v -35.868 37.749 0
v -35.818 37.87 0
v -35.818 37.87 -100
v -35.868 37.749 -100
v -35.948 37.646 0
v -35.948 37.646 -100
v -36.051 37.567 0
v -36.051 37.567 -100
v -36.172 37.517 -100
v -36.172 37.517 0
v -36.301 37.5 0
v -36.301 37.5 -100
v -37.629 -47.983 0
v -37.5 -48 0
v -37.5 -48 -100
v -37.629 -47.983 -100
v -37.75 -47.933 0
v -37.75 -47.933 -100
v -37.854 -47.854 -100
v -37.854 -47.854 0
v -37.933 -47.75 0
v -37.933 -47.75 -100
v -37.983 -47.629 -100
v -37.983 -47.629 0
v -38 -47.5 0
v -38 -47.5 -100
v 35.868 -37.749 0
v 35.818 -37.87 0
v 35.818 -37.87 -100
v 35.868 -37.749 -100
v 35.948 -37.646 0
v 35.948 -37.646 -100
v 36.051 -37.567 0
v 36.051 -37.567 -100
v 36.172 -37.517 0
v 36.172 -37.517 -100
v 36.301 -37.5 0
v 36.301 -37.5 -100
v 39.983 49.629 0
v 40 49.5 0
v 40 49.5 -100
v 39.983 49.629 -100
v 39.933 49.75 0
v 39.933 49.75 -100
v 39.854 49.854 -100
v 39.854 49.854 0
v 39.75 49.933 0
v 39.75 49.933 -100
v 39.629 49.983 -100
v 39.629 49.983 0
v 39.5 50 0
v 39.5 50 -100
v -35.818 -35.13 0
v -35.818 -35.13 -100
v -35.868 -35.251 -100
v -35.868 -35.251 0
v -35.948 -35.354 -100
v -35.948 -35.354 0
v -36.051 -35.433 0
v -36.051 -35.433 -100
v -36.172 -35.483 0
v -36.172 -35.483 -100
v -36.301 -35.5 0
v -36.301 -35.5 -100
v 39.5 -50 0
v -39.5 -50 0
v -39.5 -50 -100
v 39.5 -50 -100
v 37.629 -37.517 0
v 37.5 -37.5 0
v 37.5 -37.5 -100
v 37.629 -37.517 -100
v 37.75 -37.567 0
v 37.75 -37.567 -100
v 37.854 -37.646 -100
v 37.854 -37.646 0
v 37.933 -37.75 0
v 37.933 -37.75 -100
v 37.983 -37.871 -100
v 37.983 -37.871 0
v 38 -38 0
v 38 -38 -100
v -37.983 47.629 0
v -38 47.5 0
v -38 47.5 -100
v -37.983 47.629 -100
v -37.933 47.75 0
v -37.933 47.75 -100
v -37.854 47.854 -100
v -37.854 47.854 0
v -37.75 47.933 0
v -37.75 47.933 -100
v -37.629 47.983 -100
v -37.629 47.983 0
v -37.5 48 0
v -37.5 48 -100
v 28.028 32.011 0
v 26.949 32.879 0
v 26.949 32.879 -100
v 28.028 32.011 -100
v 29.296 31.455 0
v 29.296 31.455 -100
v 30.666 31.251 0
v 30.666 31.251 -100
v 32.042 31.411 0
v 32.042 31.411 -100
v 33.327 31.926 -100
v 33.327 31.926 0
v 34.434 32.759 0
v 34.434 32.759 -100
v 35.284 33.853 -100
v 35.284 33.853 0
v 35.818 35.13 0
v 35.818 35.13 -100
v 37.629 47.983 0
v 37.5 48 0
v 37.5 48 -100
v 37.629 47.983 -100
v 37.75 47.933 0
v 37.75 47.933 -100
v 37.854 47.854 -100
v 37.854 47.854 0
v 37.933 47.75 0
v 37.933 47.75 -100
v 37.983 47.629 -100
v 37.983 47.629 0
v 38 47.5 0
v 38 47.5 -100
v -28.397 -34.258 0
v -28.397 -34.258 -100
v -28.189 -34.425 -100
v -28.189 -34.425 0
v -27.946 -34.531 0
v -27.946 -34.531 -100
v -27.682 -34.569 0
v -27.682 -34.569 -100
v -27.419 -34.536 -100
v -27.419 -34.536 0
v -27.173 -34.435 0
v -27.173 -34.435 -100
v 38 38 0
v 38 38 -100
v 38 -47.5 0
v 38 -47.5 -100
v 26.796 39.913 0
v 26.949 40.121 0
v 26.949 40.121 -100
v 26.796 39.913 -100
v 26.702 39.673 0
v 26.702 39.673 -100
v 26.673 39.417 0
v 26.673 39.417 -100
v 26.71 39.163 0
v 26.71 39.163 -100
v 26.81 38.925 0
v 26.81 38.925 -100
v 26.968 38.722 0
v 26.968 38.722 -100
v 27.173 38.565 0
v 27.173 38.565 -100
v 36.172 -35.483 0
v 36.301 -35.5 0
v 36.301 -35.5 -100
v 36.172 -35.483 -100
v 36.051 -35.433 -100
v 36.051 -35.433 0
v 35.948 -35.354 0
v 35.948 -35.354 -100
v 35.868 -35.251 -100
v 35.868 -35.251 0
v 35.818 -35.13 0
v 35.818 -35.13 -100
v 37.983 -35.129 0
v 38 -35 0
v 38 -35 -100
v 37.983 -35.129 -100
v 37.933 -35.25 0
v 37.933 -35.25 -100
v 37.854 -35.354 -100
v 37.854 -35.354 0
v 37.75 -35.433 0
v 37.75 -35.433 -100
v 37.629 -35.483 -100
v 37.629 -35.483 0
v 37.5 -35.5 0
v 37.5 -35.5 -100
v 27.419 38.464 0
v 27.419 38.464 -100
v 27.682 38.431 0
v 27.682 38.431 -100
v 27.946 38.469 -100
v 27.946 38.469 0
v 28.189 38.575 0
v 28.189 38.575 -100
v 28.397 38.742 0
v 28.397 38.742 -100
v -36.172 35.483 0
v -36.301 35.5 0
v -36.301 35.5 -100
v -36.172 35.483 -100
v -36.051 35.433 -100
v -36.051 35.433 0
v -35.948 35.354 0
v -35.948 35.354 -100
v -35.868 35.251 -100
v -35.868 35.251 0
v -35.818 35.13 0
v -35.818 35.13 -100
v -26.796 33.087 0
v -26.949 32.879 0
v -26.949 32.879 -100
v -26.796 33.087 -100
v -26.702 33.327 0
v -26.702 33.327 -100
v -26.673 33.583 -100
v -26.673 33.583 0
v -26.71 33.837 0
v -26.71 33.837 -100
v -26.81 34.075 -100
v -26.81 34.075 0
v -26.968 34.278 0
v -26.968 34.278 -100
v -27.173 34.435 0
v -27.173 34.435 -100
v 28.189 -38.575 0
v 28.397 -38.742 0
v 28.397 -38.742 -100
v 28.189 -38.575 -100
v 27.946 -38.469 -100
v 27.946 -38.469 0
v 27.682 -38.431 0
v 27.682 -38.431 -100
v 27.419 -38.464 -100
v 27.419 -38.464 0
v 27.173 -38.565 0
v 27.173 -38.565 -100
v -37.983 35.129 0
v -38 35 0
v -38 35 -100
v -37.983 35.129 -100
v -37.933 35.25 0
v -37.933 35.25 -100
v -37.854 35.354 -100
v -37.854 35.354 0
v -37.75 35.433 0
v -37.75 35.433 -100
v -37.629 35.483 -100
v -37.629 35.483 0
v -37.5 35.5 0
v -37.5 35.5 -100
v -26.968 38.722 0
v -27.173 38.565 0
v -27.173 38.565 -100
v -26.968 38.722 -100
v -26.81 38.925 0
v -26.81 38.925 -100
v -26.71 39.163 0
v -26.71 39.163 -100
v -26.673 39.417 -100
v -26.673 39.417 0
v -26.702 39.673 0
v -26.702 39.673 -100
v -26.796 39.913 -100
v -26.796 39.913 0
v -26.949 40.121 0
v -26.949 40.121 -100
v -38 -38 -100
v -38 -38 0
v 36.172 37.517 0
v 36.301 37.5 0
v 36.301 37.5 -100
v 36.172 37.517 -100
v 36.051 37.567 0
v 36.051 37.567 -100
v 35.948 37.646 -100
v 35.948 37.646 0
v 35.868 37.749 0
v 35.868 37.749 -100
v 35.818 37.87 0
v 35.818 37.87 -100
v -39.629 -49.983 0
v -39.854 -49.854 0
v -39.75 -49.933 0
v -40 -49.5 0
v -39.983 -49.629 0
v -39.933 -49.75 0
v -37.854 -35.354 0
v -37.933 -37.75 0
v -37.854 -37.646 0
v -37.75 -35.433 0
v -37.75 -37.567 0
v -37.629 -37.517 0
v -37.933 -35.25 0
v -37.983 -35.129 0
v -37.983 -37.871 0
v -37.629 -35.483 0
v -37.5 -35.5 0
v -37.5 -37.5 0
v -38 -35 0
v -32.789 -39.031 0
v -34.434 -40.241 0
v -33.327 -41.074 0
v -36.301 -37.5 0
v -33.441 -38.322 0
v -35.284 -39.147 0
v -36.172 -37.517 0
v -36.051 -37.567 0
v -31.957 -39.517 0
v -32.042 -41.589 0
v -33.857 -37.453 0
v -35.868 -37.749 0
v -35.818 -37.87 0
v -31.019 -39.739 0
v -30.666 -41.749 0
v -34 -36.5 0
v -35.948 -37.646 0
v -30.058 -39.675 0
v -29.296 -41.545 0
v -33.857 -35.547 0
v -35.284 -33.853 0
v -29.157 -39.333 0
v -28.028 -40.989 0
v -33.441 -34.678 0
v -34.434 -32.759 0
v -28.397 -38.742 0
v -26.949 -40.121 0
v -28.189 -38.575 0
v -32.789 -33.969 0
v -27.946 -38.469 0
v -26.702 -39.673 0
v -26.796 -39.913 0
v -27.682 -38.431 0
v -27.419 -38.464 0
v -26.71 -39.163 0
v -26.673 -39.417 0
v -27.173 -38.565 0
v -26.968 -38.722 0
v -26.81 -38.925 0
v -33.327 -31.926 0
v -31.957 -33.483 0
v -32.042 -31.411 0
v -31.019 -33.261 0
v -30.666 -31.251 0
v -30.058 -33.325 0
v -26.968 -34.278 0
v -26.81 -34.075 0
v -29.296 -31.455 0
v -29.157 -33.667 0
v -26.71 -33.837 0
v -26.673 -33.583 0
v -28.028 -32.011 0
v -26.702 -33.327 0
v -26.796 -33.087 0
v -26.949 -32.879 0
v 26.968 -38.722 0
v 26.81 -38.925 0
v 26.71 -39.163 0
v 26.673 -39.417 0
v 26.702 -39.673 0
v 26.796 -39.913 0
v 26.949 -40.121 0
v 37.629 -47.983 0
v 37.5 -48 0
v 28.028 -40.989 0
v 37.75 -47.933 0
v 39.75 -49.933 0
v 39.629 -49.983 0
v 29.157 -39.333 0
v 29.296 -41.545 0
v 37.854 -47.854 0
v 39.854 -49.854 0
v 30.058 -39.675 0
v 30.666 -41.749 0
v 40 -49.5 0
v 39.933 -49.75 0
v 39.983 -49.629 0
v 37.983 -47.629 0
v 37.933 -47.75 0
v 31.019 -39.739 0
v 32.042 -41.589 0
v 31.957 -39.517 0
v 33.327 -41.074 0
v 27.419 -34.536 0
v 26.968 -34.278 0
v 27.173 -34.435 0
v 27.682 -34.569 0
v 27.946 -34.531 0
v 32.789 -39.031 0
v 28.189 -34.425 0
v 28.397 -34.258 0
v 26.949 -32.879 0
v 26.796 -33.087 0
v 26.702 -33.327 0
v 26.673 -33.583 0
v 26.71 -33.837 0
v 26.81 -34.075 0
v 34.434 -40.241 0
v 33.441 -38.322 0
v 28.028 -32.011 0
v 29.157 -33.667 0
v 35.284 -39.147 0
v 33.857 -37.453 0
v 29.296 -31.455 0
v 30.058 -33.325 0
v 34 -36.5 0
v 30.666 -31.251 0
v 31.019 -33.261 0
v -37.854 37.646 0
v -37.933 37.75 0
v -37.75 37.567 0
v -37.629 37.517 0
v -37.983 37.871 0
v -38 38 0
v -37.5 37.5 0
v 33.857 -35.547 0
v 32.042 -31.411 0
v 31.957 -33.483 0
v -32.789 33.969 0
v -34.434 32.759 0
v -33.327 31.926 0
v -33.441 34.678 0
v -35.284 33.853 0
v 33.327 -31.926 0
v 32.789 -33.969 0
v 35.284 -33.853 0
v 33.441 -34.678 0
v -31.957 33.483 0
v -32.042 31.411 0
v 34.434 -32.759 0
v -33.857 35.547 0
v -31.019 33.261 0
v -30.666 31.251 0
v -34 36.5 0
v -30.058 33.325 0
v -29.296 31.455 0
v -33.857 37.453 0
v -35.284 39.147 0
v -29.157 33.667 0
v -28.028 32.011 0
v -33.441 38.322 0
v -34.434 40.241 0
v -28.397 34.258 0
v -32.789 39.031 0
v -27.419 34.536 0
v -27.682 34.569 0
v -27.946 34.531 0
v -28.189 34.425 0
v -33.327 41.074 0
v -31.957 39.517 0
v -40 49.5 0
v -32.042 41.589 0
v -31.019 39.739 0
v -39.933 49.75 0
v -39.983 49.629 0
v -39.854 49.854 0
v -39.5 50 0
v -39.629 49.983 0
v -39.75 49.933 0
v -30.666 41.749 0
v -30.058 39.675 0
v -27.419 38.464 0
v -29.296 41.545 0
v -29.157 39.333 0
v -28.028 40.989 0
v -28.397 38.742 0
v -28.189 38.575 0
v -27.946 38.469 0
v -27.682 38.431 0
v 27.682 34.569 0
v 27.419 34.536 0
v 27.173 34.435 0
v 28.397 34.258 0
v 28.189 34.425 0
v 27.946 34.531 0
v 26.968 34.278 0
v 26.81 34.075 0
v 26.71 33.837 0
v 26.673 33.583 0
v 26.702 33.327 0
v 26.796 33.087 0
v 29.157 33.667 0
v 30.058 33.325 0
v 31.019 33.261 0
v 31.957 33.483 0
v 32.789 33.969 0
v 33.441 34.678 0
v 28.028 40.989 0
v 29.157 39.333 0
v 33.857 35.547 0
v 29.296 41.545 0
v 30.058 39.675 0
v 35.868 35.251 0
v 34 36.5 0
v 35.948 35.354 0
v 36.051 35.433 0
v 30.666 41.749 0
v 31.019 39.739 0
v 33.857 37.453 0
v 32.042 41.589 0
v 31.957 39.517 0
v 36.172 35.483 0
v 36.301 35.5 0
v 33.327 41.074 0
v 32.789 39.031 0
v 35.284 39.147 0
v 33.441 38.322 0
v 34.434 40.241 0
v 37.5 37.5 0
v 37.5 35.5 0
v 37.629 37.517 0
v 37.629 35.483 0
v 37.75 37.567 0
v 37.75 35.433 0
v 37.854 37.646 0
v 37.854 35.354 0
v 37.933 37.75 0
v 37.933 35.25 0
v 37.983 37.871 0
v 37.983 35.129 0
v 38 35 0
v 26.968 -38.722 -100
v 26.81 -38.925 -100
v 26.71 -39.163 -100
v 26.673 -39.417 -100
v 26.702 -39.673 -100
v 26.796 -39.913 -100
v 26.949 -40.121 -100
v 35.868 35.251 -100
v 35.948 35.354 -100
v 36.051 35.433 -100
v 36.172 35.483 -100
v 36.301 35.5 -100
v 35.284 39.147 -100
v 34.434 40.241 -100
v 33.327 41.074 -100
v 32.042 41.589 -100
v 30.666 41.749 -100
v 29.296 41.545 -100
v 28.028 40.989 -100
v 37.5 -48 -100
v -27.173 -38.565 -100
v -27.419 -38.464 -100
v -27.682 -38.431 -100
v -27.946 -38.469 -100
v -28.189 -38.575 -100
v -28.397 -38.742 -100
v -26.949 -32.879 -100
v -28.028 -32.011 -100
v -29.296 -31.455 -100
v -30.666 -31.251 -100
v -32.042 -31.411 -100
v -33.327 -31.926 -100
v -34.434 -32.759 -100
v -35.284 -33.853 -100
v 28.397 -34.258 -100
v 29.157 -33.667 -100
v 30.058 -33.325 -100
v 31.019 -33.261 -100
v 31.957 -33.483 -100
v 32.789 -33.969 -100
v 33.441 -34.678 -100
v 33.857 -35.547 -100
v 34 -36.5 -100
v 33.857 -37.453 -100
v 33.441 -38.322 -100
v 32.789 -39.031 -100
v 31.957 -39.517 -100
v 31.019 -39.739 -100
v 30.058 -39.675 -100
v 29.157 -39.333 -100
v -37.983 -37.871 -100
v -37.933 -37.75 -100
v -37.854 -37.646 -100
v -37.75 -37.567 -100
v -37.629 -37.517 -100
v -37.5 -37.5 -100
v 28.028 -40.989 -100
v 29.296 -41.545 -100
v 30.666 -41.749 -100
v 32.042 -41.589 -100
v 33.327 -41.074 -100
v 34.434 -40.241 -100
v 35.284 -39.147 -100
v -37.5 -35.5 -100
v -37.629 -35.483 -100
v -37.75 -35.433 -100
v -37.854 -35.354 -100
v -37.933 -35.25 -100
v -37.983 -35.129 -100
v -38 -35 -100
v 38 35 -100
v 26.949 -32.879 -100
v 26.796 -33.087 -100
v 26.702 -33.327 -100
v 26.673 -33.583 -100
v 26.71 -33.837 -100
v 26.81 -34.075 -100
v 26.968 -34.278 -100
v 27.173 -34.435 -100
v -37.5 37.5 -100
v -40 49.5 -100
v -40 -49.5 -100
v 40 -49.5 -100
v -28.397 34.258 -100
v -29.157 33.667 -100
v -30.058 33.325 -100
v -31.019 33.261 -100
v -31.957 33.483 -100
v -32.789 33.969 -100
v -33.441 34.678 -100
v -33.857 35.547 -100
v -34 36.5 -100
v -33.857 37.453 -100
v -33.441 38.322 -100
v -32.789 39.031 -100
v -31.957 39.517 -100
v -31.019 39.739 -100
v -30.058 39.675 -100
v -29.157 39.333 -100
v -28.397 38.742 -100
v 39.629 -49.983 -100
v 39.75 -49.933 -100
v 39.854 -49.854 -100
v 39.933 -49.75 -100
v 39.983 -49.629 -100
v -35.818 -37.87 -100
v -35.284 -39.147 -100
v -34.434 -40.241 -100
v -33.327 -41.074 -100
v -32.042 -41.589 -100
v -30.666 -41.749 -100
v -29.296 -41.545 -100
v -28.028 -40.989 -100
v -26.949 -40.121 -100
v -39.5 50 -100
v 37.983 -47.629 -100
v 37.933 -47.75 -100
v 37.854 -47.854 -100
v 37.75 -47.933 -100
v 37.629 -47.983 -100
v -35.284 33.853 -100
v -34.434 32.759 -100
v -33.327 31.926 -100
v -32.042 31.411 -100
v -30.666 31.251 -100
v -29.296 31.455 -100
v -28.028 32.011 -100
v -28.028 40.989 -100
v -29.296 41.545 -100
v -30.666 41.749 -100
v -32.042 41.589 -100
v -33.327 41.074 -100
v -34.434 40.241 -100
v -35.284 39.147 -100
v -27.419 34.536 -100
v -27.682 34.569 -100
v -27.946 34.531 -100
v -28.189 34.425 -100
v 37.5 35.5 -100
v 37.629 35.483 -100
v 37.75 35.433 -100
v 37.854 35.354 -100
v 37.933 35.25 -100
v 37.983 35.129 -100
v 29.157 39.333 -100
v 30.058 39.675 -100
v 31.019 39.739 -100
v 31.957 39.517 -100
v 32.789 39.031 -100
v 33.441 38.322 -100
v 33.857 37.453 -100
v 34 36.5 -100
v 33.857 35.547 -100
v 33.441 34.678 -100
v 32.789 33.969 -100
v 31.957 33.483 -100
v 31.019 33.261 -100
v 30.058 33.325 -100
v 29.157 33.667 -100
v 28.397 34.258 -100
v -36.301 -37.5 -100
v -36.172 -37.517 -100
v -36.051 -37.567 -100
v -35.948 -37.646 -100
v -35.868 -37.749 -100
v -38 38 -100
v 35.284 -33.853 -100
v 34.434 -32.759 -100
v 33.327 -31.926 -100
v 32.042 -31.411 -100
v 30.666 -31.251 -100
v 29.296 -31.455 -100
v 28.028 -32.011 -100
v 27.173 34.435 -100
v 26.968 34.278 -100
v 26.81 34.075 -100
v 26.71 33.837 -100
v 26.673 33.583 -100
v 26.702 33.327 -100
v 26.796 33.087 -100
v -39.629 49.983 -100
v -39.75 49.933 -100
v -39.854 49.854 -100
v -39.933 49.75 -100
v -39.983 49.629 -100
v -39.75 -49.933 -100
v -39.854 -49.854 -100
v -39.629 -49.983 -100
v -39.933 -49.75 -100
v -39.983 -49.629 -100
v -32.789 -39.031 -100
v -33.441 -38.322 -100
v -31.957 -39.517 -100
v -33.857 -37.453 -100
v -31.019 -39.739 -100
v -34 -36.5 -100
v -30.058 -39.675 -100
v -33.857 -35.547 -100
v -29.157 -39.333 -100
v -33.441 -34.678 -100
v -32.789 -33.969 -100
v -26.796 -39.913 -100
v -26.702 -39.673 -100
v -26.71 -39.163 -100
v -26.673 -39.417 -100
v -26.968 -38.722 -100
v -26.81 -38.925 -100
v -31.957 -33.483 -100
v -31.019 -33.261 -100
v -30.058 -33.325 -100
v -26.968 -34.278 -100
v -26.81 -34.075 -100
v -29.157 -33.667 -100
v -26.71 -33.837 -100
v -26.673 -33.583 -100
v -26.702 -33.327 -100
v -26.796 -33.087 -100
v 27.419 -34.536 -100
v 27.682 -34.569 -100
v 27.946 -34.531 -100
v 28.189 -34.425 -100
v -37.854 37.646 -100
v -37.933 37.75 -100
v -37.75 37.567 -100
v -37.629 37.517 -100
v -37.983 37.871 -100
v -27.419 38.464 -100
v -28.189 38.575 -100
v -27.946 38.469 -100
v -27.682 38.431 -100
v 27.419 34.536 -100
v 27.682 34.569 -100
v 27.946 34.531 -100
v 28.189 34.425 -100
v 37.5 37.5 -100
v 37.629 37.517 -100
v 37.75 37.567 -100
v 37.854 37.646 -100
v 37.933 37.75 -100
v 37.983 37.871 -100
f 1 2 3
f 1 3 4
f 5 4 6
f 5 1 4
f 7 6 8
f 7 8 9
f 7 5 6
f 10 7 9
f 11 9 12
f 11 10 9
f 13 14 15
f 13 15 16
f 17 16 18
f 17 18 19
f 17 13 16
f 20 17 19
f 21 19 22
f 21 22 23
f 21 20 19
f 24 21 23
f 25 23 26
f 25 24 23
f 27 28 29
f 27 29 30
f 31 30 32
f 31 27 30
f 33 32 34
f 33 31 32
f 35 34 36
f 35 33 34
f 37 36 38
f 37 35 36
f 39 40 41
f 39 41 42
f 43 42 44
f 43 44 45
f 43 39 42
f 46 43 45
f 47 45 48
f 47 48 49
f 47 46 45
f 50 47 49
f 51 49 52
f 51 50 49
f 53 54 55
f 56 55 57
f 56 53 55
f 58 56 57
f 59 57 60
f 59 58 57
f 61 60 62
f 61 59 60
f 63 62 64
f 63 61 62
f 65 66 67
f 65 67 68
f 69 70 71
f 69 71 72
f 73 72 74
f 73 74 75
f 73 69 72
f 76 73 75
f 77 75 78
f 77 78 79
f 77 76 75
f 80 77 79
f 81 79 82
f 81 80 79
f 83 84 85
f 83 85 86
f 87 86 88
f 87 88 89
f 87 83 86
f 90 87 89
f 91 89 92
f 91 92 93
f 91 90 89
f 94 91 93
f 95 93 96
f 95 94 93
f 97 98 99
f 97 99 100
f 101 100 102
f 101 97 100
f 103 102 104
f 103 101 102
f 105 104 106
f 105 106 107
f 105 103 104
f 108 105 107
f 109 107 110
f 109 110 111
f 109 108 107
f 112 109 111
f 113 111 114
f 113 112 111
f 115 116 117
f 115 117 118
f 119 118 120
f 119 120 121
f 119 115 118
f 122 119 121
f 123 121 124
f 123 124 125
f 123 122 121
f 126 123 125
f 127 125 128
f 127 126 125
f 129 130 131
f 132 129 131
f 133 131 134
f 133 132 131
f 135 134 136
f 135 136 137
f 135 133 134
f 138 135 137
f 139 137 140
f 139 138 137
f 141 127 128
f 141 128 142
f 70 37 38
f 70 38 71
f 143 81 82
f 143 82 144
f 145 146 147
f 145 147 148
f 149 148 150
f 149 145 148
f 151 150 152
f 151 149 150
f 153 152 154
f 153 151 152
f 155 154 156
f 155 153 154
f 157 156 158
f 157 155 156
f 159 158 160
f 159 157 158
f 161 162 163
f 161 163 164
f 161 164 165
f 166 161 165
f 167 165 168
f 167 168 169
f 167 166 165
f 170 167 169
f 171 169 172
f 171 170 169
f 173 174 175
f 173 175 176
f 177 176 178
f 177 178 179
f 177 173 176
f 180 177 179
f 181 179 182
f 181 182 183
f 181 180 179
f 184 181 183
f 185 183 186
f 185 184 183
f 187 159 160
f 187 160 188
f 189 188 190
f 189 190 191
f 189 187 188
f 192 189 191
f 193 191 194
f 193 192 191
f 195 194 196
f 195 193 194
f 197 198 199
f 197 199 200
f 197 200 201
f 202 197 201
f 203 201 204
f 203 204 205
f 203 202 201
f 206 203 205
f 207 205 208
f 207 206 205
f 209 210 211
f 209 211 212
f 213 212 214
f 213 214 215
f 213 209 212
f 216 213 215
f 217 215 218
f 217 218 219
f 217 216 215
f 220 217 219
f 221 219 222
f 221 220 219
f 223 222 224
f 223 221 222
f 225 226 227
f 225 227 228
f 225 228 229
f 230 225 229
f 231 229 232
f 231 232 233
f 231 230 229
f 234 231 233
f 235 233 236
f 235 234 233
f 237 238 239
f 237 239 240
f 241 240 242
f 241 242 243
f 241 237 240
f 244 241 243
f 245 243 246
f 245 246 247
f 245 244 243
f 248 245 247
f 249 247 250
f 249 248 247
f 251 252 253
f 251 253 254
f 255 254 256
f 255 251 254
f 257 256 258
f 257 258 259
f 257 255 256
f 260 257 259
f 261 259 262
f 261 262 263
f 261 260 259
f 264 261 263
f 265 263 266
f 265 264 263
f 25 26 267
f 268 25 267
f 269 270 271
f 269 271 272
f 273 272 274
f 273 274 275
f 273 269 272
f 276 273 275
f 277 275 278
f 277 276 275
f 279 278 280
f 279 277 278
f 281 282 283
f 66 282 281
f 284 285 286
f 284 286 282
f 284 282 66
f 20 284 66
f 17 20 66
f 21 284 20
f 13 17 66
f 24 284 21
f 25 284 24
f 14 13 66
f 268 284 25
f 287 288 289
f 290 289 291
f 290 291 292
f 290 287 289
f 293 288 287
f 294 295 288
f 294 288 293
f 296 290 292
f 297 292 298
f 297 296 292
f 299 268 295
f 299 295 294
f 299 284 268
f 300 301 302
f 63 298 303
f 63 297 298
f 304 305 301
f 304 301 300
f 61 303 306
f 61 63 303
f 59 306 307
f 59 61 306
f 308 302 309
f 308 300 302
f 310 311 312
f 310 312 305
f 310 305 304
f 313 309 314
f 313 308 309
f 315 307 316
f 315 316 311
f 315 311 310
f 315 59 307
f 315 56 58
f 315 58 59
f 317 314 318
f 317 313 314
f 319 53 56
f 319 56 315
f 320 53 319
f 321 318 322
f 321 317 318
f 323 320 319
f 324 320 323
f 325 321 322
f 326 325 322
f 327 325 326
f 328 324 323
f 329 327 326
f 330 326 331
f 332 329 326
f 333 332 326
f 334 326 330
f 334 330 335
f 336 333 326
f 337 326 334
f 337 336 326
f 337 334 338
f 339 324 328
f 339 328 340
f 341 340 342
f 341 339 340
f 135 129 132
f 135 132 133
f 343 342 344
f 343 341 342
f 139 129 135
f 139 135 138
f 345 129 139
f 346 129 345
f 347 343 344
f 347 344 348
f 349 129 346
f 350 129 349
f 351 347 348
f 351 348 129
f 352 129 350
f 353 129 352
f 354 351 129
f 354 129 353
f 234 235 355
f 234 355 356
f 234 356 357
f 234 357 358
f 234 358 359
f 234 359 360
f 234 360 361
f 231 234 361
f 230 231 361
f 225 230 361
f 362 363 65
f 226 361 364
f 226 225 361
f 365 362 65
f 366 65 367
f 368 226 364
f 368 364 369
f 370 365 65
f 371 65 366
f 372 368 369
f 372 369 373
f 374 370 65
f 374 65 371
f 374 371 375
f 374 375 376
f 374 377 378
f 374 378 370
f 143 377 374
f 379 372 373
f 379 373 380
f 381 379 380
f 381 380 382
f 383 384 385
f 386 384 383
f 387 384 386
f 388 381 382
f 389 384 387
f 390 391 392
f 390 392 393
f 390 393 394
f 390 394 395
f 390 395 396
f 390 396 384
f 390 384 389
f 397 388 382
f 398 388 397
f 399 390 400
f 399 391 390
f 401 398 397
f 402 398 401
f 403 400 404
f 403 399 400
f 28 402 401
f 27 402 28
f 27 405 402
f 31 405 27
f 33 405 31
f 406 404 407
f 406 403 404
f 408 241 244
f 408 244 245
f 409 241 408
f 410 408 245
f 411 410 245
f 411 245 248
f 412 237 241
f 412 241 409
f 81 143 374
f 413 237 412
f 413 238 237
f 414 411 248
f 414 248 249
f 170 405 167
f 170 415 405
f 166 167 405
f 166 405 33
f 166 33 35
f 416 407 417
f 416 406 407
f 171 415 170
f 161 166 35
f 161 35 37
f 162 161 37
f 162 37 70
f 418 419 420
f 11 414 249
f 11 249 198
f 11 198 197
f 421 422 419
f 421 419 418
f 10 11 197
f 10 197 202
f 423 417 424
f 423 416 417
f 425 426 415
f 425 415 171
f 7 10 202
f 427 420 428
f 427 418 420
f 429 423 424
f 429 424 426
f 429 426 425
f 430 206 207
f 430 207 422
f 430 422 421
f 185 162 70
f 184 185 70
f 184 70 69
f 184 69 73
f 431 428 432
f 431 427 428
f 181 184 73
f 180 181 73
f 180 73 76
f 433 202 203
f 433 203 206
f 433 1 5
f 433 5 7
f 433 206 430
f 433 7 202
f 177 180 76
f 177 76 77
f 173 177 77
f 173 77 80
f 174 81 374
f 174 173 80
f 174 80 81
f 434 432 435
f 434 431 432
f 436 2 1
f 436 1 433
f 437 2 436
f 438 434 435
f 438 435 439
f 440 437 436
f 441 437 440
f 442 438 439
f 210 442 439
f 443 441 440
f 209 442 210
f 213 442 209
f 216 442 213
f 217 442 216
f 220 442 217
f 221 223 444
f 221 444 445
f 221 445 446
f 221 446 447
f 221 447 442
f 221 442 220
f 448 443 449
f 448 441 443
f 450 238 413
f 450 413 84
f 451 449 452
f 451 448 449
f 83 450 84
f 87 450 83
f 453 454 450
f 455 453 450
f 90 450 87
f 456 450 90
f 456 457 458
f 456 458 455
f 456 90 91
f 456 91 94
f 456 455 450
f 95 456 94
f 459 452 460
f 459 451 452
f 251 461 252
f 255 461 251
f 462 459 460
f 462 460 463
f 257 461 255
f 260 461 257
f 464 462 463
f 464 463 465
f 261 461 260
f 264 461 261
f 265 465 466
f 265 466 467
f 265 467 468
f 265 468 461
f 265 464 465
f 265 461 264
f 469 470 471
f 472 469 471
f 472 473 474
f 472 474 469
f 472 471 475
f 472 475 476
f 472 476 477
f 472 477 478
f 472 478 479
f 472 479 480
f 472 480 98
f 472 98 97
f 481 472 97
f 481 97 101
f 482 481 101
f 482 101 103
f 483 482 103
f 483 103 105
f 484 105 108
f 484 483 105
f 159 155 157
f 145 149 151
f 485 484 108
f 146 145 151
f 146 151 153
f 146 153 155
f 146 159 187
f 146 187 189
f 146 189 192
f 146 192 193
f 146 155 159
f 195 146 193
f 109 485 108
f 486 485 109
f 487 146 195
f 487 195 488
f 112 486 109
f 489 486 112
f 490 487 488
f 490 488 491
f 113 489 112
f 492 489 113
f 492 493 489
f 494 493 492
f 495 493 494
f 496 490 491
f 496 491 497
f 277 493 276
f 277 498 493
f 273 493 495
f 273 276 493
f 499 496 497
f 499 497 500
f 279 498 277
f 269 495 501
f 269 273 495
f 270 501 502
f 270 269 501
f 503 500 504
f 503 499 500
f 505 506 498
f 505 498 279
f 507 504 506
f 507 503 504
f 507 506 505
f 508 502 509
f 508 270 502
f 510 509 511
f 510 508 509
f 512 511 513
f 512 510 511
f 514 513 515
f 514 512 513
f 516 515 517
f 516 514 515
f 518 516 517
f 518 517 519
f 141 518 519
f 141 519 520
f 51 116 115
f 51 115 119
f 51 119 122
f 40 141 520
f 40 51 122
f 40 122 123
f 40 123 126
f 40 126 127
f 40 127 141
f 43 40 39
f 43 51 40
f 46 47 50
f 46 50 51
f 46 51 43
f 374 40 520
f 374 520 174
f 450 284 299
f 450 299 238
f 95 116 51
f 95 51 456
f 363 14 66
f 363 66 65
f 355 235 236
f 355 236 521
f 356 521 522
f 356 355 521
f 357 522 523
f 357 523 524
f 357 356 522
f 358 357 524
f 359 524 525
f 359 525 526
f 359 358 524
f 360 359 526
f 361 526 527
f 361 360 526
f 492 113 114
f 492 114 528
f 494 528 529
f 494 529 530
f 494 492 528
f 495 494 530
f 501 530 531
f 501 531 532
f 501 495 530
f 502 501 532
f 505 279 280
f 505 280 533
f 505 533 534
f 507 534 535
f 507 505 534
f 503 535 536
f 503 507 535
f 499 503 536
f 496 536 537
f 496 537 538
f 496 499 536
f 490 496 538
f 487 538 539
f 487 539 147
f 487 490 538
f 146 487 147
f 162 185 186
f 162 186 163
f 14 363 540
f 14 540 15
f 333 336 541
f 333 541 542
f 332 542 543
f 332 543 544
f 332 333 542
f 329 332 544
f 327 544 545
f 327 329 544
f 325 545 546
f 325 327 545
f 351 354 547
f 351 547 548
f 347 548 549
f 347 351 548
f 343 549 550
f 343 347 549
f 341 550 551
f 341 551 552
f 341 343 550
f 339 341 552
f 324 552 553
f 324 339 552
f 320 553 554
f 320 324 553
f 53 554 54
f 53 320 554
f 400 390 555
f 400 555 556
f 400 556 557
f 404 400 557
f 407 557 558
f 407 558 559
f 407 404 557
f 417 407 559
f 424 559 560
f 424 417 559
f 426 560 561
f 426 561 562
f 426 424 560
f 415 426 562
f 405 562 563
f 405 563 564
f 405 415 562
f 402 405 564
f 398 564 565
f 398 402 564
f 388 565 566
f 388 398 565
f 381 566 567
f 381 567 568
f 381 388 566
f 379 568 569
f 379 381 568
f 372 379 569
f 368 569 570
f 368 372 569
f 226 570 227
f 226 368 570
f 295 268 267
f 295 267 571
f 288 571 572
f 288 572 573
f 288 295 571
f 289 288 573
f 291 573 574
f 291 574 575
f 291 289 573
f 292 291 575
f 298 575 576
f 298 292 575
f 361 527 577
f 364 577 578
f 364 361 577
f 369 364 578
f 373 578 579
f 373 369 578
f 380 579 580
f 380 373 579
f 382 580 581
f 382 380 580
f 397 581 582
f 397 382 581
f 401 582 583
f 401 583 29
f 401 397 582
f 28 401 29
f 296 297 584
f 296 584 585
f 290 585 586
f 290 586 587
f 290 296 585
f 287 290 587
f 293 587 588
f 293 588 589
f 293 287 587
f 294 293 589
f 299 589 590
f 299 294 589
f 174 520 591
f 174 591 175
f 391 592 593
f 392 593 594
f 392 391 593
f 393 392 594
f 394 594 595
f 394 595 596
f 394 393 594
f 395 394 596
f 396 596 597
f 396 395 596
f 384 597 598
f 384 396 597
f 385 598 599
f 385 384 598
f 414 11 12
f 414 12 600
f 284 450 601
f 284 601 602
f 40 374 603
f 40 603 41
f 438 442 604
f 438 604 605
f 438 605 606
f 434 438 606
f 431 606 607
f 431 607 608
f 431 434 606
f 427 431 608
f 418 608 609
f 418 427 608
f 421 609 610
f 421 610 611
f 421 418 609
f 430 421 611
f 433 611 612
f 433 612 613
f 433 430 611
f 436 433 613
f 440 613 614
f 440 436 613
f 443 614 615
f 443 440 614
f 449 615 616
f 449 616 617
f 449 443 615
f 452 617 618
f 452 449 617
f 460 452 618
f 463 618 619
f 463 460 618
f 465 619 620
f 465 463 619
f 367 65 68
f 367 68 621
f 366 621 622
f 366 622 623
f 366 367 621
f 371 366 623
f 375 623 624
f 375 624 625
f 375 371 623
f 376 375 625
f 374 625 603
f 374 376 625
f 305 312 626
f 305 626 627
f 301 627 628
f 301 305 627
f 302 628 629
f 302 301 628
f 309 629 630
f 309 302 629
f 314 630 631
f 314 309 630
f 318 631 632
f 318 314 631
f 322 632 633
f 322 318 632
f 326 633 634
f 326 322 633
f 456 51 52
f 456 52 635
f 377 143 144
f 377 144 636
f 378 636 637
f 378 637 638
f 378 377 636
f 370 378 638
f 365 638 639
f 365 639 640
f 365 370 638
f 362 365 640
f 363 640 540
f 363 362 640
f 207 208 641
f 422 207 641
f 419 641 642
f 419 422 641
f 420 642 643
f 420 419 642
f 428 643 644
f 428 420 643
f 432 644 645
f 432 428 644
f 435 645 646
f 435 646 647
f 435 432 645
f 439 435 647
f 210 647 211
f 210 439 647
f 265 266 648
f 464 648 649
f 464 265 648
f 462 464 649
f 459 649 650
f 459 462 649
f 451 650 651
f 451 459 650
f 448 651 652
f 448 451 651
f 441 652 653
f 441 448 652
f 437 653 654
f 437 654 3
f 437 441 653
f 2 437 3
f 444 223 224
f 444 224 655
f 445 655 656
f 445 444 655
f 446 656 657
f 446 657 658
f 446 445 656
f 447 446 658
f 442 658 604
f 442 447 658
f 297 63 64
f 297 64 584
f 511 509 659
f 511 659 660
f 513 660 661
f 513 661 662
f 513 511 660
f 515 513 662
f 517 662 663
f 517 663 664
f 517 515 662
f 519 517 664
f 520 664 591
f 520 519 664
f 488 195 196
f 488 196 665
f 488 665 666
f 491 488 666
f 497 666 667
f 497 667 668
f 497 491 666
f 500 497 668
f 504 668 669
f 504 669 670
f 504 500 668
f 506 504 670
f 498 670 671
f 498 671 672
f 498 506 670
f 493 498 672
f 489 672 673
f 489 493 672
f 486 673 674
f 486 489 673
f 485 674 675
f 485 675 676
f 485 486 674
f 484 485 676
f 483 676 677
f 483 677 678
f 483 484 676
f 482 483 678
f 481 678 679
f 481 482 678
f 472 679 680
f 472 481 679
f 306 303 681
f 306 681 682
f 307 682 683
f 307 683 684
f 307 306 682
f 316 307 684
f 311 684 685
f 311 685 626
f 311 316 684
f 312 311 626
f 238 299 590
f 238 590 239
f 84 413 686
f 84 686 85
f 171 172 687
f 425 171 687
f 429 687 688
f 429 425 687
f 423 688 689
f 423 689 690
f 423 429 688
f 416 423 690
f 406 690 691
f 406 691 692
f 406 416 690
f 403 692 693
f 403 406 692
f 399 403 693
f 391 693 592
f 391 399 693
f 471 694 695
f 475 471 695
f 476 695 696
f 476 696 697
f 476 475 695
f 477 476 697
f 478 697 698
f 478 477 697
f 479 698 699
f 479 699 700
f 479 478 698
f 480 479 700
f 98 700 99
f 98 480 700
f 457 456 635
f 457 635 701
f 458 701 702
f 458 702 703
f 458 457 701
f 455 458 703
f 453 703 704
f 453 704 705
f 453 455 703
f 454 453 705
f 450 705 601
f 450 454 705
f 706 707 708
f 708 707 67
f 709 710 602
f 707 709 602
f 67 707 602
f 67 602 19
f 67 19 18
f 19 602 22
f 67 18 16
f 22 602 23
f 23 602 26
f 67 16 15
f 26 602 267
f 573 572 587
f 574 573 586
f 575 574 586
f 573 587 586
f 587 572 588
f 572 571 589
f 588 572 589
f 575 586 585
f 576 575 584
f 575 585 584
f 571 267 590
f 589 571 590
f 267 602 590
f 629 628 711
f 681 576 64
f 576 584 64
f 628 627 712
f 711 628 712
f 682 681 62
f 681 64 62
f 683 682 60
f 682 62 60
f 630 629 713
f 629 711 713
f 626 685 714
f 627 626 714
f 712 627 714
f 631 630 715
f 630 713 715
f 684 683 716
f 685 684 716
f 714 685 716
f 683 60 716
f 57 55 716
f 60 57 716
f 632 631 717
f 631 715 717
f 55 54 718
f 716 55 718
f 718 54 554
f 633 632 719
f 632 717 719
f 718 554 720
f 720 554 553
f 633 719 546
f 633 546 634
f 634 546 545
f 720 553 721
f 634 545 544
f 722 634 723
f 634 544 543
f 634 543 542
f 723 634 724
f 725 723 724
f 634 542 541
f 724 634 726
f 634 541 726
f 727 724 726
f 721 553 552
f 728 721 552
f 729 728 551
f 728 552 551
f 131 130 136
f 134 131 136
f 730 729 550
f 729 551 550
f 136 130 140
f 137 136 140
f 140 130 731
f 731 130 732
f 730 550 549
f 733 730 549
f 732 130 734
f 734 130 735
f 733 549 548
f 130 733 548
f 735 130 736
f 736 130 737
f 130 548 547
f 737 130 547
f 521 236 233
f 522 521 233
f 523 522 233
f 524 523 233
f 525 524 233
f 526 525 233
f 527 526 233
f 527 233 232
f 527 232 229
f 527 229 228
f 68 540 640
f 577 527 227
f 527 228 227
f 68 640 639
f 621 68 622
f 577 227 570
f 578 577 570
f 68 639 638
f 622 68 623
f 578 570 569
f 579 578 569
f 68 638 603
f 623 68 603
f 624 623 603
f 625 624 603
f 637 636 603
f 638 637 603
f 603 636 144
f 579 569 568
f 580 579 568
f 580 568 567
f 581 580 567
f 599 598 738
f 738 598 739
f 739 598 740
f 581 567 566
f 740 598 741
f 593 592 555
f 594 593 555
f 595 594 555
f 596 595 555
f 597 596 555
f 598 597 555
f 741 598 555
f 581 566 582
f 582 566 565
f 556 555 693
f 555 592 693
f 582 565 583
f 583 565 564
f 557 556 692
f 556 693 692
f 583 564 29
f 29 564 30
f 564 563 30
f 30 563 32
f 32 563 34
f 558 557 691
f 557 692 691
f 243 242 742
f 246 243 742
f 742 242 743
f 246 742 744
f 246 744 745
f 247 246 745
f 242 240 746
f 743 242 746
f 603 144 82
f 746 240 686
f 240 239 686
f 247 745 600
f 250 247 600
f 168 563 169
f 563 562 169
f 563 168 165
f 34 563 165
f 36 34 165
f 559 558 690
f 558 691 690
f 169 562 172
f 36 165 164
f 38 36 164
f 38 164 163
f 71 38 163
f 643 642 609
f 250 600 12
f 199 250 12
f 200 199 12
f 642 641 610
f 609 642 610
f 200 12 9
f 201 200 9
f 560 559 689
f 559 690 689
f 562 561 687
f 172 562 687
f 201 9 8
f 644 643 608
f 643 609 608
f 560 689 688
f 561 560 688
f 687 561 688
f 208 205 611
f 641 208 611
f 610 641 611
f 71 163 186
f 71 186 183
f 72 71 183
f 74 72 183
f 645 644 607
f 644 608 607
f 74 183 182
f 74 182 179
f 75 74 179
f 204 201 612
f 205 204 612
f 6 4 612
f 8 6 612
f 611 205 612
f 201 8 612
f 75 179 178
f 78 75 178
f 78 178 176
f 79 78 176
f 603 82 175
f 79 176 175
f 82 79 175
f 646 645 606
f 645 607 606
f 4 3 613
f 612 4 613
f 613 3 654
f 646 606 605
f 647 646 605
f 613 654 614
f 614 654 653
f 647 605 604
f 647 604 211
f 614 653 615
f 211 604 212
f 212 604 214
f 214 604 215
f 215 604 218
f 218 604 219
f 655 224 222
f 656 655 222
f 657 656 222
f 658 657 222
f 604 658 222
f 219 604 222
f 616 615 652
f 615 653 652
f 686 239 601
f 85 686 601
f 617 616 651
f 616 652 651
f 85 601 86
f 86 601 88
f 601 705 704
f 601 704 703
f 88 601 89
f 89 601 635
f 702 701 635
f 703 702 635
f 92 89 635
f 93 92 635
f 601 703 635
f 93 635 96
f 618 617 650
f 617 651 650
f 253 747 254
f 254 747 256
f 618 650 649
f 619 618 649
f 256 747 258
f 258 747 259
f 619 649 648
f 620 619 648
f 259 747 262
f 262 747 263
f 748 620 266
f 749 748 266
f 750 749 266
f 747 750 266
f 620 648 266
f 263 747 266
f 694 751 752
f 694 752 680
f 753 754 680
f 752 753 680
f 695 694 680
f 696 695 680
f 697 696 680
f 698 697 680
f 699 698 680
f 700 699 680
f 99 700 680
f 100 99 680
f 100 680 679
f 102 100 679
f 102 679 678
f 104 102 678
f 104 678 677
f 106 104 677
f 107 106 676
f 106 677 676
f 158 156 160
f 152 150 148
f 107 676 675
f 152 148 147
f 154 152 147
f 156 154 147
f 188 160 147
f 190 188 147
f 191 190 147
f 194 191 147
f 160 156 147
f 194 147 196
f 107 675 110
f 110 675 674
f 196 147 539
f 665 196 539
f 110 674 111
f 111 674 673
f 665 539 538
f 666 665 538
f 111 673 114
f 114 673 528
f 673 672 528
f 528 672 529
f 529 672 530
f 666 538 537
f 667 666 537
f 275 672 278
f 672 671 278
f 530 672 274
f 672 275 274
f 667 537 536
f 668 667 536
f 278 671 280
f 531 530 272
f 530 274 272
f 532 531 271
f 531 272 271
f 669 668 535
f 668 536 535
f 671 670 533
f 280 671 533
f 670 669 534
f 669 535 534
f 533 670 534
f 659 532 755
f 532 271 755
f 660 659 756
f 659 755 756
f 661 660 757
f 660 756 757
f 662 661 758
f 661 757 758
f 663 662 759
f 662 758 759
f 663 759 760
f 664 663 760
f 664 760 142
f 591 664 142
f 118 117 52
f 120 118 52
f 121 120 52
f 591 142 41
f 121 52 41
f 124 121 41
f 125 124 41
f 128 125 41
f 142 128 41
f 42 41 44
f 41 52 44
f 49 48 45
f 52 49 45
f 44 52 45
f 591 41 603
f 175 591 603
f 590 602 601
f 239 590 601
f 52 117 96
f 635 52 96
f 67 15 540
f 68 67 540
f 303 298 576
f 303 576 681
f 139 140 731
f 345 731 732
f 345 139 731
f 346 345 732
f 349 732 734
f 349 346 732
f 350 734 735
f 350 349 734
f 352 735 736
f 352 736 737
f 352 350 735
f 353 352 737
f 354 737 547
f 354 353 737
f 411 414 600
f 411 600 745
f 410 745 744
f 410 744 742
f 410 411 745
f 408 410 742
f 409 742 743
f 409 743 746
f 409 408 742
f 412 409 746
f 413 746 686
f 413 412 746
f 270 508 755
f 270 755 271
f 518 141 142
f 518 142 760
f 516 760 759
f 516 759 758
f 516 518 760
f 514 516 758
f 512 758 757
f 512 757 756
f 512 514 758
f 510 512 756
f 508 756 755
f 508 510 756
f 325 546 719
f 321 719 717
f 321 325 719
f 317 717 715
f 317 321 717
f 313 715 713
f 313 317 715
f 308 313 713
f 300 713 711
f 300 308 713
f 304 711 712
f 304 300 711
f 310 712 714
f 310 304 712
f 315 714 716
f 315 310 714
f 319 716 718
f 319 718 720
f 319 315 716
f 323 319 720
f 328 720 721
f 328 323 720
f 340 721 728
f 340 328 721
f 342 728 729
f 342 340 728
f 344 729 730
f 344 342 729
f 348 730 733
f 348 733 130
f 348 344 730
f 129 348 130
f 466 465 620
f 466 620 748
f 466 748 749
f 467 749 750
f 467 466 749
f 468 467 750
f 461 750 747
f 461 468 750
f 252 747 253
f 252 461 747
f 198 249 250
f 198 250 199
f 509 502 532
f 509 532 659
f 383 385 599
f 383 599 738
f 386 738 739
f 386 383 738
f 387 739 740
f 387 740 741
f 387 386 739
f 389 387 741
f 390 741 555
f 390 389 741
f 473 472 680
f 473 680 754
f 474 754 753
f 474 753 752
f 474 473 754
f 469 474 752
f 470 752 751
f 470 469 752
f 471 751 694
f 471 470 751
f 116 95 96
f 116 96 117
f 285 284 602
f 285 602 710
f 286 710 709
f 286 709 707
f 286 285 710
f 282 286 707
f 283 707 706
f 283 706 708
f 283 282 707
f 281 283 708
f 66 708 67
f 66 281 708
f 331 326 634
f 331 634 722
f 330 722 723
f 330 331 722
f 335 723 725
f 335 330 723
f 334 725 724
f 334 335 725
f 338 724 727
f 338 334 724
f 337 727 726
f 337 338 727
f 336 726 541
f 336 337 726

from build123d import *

# Parameters (mm, degrees)
F1_DEPTH = 100


# Not quite as in the source:
# - ends of sketch curves that miss each other by under 0.0002 mm in the source are joined


with BuildPart() as f1:
    # F0 (on Top) → F1 (new body)
    with BuildSketch(Plane.XY):
        with BuildLine():
            Line((40, -49.5), (40, 49.5))
            ThreePointArc((40, 49.5), (39.8535533906, 49.8535533906), (39.5, 50))
            Line((39.5, 50), (-39.5, 50))
            ThreePointArc((-39.5, 50), (-39.8535533906, 49.8535533906), (-40, 49.5))
            Line((-40, 49.5), (-40, -49.5))
            ThreePointArc((-40, -49.5), (-39.8535533906, -49.8535533906), (-39.5, -50))
            Line((-39.5, -50), (39.5, -50))
            ThreePointArc((39.5, -50), (39.8535533906, -49.8535533906), (40, -49.5))
        make_face()
        with BuildLine():
            ThreePointArc((37.5, 48), (37.8535533906, 47.8535533906), (38, 47.5))
            Line((38, 47.5), (38, 38))
            ThreePointArc((38, 38), (37.8535533906, 37.6464466094), (37.5, 37.5))
            Line((37.5, 37.5), (36.300901, 37.5))
            ThreePointArc((36.300901, 37.5), (35.9969413236, 37.6030006107), (35.8182137763, 37.8695659396))
            ThreePointArc((35.8182137763, 37.8695659396), (32.0417405862, 41.5886055318), (26.9486644214, 40.1210975986))
            ThreePointArc((26.9486644214, 40.1210975986), (26.6829406294, 39.2888133915), (27.1727282582, 38.5653394472))
            ThreePointArc((27.1727282582, 38.5653394472), (27.8152796085, 38.4415776294), (28.396791896, 38.7416320991))
            ThreePointArc((28.396791896, 38.7416320991), (34, 36.499999638), (28.3967917139, 34.2583687274))
            ThreePointArc((28.3967917139, 34.2583687274), (27.815279361, 34.5584234062), (27.1727278252, 34.4346613028))
            ThreePointArc((27.1727278252, 34.4346613028), (26.6829405938, 33.711187361), (26.948664104, 32.8789030991))
            ThreePointArc((26.948664104, 32.8789030991), (32.0417407031, 31.4113944979), (35.8182138677, 35.1304350358))
            ThreePointArc((35.8182138677, 35.1304350358), (35.9969417068, 35.3969996827), (36.300901, 35.5))
            Line((36.300901, 35.5), (37.5, 35.5))
            ThreePointArc((37.5, 35.5), (37.8535533906, 35.3535533906), (38, 35))
            Line((38, 35), (38, -35.000003))
            ThreePointArc((38, -35.000003), (37.8535533906, -35.3535563906), (37.5, -35.500003))
            Line((37.5, -35.500003), (36.300901, -35.500003))
            ThreePointArc((36.300901, -35.500003), (35.9969417068, -35.3970026827), (35.8182140282, -35.1304379924))
            ThreePointArc((35.8182140282, -35.1304379924), (32.0417407032, -31.4113974979), (26.948663922, -32.8789059257))
            ThreePointArc((26.948663922, -32.8789059257), (26.6829405938, -33.711190361), (27.1727278252, -34.4346643028))
            ThreePointArc((27.1727278252, -34.4346643028), (27.815279361, -34.5584264062), (28.396791896, -34.2583719009))
            ThreePointArc((28.396791896, -34.2583719009), (34, -36.500002638), (28.3967922133, -38.7416347968))
            ThreePointArc((28.3967922133, -38.7416347968), (27.8152796085, -38.4415806294), (27.1727282582, -38.5653424472))
            ThreePointArc((27.1727282582, -38.5653424472), (26.6829406294, -39.2888163915), (26.948664104, -40.1211009009))
            ThreePointArc((26.948664104, -40.1211009009), (32.0417405862, -41.5886085318), (35.8182136159, -37.8695688962))
            ThreePointArc((35.8182136159, -37.8695688962), (35.9969413236, -37.6030036107), (36.300901, -37.500003))
            Line((36.300901, -37.500003), (37.5, -37.500003))
            ThreePointArc((37.5, -37.500003), (37.8535533906, -37.6464496094), (38, -38.000003))
            Line((38, -38.000003), (38, -47.5))
            ThreePointArc((38, -47.5), (37.8535533906, -47.8535533906), (37.5, -48))
            Line((37.5, -48), (-37.5, -48))
            ThreePointArc((-37.5, -48), (-37.8535533906, -47.8535533906), (-38, -47.5))
            Line((-38, -47.5), (-38, -38.000003))
            ThreePointArc((-38, -38.000003), (-37.8535533906, -37.6464496094), (-37.5, -37.500003))
            Line((-37.5, -37.500003), (-36.300901, -37.500003))
            ThreePointArc((-36.300901, -37.500003), (-35.9969413236, -37.6030036107), (-35.8182137763, -37.8695689396))
            ThreePointArc((-35.8182137763, -37.8695689396), (-32.0417405862, -41.5886085318), (-26.9486644214, -40.1211005986))
            ThreePointArc((-26.9486644214, -40.1211005986), (-26.6829406294, -39.2888163915), (-27.1727282582, -38.5653424472))
            ThreePointArc((-27.1727282582, -38.5653424472), (-27.8152796085, -38.4415806294), (-28.396791896, -38.7416350991))
            ThreePointArc((-28.396791896, -38.7416350991), (-34, -36.500002638), (-28.3967917139, -34.2583717274))
            ThreePointArc((-28.3967917139, -34.2583717274), (-27.815279361, -34.5584264062), (-27.1727278252, -34.4346643028))
            ThreePointArc((-27.1727278252, -34.4346643028), (-26.6829405938, -33.711190361), (-26.948664104, -32.8789060991))
            ThreePointArc((-26.948664104, -32.8789060991), (-32.0417407032, -31.4113974979), (-35.8182138677, -35.1304380358))
            ThreePointArc((-35.8182138677, -35.1304380358), (-35.9969417068, -35.3970026827), (-36.300901, -35.500003))
            Line((-36.300901, -35.500003), (-37.5, -35.500003))
            ThreePointArc((-37.5, -35.500003), (-37.8535533906, -35.3535563906), (-38, -35.000003))
            Line((-38, -35.000003), (-38, 35))
            ThreePointArc((-38, 35), (-37.8535533906, 35.3535533906), (-37.5, 35.5))
            Line((-37.5, 35.5), (-36.300901, 35.5))
            ThreePointArc((-36.300901, 35.5), (-35.9969417068, 35.3969996827), (-35.8182140282, 35.1304349924))
            ThreePointArc((-35.8182140282, 35.1304349924), (-32.0417407031, 31.4113944979), (-26.948663922, 32.8789029257))
            ThreePointArc((-26.948663922, 32.8789029257), (-26.6829405938, 33.711187361), (-27.1727278252, 34.4346613028))
            ThreePointArc((-27.1727278252, 34.4346613028), (-27.815279361, 34.5584234062), (-28.396791896, 34.2583689009))
            ThreePointArc((-28.396791896, 34.2583689009), (-34, 36.499999638), (-28.3967922133, 38.7416317968))
            ThreePointArc((-28.3967922133, 38.7416317968), (-27.8152796085, 38.4415776294), (-27.1727282582, 38.5653394472))
            ThreePointArc((-27.1727282582, 38.5653394472), (-26.6829406294, 39.2888133915), (-26.948664104, 40.1210979009))
            ThreePointArc((-26.948664104, 40.1210979009), (-32.0417405862, 41.5886055318), (-35.8182136159, 37.8695658962))
            ThreePointArc((-35.8182136159, 37.8695658962), (-35.9969413236, 37.6030006107), (-36.300901, 37.5))
            Line((-36.300901, 37.5), (-37.5, 37.5))
            ThreePointArc((-37.5, 37.5), (-37.8535533906, 37.6464466094), (-38, 38))
            Line((-38, 38), (-38, 47.5))
            ThreePointArc((-38, 47.5), (-37.8535533906, 47.8535533906), (-37.5, 48))
            Line((-37.5, 48), (37.5, 48))
        make_face(mode=Mode.SUBTRACT)
    extrude(amount=-F1_DEPTH)


solid = f1.part
